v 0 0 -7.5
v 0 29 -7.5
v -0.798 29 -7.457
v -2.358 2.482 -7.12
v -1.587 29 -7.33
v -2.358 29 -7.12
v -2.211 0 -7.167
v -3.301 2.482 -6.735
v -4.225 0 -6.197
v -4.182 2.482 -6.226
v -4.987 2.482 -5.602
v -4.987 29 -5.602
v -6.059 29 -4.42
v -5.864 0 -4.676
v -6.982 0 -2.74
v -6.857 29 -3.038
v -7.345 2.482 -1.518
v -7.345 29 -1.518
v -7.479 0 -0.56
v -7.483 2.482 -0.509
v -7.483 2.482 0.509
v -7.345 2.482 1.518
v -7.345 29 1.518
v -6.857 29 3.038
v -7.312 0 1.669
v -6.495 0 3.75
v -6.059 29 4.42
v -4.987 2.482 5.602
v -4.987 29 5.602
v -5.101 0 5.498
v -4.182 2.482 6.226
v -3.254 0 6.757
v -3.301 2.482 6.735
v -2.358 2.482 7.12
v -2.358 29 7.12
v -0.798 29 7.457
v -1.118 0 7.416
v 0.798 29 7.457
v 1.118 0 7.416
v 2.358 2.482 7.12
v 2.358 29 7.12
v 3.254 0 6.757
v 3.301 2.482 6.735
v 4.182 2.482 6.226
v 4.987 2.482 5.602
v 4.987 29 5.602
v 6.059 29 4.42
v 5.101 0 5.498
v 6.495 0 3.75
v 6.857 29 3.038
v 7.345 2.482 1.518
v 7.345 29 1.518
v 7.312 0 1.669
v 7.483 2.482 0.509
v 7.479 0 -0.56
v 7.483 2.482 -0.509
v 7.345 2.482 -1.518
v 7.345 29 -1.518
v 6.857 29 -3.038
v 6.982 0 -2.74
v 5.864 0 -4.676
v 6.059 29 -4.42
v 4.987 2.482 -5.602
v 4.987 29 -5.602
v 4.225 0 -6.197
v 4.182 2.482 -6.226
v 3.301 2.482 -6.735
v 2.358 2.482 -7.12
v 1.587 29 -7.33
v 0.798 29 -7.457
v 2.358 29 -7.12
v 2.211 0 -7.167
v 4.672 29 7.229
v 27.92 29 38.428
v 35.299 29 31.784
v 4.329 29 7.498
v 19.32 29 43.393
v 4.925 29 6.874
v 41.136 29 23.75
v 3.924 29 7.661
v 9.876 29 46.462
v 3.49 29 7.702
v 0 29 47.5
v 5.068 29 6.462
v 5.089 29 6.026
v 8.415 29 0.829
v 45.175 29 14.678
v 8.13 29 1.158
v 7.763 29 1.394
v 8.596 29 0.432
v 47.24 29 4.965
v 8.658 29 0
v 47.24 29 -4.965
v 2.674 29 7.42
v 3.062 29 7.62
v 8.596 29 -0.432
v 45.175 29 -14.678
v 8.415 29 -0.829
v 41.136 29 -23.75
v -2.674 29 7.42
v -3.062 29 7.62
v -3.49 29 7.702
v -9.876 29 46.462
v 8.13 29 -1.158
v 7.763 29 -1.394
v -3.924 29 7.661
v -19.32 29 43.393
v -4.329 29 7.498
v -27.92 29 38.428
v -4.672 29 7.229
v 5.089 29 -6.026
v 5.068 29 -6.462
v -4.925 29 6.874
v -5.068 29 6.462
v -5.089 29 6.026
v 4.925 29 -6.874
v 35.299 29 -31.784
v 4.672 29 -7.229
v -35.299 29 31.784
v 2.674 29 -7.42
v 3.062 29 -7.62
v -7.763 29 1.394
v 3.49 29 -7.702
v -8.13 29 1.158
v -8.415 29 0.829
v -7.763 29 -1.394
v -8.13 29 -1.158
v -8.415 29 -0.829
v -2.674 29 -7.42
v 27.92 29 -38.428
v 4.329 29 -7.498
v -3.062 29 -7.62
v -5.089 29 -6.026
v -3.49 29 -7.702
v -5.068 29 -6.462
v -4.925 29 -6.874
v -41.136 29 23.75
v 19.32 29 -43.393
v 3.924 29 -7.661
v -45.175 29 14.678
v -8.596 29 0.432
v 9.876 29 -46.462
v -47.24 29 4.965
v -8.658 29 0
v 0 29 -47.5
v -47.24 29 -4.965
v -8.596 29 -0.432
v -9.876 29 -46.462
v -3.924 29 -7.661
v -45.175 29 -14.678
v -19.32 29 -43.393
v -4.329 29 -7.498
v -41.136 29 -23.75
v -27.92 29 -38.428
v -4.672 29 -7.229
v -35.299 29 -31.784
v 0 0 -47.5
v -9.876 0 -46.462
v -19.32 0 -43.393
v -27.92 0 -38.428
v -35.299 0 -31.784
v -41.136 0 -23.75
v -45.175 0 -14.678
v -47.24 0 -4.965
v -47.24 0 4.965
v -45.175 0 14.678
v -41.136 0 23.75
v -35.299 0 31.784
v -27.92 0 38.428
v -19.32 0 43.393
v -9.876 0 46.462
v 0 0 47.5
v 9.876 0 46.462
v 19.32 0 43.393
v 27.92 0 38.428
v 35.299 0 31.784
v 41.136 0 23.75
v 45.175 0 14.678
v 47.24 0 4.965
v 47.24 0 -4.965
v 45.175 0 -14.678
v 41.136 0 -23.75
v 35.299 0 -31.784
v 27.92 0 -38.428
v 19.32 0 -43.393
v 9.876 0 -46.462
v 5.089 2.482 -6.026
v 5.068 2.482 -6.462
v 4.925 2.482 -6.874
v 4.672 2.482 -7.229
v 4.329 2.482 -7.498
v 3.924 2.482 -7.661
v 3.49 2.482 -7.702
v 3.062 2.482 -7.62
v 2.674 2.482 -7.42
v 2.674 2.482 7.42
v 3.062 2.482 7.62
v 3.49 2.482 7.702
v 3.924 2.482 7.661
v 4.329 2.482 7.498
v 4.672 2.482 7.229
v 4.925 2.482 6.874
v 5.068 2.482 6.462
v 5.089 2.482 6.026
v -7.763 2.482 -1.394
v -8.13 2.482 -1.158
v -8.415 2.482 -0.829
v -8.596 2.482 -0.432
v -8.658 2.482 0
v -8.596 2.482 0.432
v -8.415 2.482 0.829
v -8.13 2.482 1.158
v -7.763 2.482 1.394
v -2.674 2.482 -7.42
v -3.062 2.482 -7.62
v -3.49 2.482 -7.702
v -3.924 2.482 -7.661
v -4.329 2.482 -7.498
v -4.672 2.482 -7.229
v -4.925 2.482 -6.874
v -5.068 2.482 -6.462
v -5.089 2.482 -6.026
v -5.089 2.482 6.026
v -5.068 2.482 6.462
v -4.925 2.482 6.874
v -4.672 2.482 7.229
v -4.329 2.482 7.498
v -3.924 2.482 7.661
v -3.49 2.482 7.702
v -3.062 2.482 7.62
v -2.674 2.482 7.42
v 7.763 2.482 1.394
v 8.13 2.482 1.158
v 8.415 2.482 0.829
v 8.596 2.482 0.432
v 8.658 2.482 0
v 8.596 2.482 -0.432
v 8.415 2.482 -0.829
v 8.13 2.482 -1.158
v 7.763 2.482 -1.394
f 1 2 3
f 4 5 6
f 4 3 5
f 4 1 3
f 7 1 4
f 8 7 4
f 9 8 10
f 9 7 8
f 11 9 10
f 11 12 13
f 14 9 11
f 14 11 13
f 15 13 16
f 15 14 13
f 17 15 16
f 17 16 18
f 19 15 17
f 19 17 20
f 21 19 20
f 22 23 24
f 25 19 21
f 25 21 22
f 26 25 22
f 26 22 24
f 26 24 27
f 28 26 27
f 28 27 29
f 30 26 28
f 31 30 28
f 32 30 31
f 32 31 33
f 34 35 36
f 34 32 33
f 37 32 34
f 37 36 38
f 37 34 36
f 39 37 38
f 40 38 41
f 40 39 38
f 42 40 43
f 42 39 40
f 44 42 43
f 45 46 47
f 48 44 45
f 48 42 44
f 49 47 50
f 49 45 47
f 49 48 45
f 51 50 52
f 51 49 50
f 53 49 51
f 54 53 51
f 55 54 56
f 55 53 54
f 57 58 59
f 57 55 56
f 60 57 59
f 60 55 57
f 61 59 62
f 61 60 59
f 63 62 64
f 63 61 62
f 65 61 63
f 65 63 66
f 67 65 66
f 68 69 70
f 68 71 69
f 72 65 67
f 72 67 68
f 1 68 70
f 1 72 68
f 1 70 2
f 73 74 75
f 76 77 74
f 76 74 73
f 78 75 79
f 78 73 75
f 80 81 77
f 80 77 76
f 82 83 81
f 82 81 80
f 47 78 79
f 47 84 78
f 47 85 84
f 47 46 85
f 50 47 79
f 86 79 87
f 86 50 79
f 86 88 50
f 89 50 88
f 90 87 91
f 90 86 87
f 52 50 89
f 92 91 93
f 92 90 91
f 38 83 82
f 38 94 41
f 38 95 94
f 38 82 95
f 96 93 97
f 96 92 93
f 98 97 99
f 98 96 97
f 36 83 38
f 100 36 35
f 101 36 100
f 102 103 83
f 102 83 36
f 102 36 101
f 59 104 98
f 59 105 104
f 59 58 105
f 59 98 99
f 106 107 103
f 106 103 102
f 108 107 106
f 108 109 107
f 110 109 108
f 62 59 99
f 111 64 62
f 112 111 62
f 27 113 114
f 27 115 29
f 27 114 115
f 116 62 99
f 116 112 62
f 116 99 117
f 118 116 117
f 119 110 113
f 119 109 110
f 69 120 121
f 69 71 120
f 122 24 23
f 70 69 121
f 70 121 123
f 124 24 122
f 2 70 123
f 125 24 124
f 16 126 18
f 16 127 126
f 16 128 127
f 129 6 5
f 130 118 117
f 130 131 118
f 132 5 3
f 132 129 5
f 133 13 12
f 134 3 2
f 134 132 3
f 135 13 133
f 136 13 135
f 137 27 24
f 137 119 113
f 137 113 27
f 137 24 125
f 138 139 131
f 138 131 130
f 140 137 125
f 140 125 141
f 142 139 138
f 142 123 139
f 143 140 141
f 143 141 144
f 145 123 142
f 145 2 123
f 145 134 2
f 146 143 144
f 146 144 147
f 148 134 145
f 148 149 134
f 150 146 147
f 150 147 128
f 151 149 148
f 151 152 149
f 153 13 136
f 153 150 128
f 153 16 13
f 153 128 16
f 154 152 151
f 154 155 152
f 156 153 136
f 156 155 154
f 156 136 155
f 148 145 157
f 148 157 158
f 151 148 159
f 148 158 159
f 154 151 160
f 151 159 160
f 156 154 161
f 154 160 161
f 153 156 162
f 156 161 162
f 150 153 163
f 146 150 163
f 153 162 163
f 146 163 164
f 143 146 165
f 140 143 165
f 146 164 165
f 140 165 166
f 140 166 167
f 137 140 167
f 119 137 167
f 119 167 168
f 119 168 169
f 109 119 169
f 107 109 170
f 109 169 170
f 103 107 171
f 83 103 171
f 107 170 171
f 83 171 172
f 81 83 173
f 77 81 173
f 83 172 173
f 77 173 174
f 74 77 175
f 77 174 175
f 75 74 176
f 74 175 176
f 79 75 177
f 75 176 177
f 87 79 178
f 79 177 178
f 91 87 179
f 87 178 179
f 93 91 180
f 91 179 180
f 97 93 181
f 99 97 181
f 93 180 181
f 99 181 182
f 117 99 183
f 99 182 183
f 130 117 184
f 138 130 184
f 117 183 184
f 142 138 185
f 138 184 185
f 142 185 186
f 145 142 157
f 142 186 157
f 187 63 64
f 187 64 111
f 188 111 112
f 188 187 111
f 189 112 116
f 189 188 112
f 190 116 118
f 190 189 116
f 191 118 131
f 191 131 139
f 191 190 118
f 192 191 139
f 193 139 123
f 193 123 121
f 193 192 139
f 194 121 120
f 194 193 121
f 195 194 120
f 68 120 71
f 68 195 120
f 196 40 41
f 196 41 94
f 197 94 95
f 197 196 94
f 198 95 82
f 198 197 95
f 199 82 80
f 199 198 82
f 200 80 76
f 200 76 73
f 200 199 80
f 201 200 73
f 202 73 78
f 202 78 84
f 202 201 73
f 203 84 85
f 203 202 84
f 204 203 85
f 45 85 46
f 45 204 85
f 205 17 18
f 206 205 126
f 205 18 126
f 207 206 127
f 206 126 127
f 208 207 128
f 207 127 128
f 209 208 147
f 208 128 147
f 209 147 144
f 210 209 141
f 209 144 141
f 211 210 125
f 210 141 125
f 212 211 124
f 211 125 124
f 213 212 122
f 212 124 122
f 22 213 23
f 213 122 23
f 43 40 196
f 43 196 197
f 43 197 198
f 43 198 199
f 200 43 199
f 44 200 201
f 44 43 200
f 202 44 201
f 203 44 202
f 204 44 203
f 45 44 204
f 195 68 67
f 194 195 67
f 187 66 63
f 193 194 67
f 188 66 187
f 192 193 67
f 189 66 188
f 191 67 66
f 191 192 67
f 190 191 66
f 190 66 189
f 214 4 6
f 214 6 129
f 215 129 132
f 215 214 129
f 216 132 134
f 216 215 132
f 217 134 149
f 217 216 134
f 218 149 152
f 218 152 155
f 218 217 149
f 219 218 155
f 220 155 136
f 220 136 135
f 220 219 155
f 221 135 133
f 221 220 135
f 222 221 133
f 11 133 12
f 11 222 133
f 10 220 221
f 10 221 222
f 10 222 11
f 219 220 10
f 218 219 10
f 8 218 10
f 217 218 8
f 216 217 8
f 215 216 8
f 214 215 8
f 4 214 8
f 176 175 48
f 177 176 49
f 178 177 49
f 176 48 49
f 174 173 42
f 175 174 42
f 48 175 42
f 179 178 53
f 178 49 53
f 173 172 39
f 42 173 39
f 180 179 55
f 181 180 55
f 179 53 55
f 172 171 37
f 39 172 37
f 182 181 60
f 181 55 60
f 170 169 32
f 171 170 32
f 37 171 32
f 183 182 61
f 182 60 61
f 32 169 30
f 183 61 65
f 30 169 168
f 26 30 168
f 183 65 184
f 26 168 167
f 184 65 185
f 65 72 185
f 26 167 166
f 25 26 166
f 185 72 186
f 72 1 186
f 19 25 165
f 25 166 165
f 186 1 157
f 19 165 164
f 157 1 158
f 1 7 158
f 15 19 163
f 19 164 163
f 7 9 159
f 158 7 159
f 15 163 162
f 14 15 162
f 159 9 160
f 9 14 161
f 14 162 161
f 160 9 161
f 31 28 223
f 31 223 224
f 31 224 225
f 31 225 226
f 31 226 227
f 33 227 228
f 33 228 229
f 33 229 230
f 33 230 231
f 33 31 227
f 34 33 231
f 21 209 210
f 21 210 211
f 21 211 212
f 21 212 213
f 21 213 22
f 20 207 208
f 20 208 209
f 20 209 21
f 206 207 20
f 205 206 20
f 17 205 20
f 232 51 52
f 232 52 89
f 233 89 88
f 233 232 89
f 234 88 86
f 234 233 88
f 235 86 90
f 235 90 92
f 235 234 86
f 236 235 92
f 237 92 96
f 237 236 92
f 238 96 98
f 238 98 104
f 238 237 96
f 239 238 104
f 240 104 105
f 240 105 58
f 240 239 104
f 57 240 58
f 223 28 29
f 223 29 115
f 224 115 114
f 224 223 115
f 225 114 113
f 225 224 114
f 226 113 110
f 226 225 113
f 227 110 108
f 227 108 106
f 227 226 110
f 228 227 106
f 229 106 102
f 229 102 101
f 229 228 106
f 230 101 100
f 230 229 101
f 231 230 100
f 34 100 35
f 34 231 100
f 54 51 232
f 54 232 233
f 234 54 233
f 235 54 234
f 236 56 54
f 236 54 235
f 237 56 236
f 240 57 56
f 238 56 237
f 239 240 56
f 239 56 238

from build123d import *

# Parameters (mm, degrees)
SKETCH1_R           = 47.5
BOSS_EXTRUDE1_DEPTH = 29
SKETCH2_R           = 7.5
CUT_EXTRUDE1_DEPTH  = 74.167615787
SKETCH3_R           = 1.533548882
CUT_EXTRUDE2_DEPTH  = 26.517871126
CIRPATTERN1_COUNT   = 6


with BuildPart() as part:
    # Sketch1 → Boss-Extrude1 (new body)
    with BuildSketch(Plane(origin=(0, 0, 0), x_dir=(1, 0, 0), z_dir=(0, 1, 0))):
        Circle(SKETCH1_R)
    extrude(amount=BOSS_EXTRUDE1_DEPTH)

    # Sketch2 → Cut-Extrude1 (cut, through all)
    with BuildSketch(Plane(origin=(0, 0, 0), x_dir=(1, 0, 0), z_dir=(0, 1, 0))):
        Circle(SKETCH2_R)
    extrude(amount=CUT_EXTRUDE1_DEPTH, mode=Mode.SUBTRACT)

    # Sketch3 → Cut-Extrude2 (cut)
    with BuildSketch(Plane(origin=(0, 29, 0), x_dir=(1, 0, 0), z_dir=(0, 1, 0))):
        with Locations((-7.124914208, 0)):
            Circle(SKETCH3_R)
    cut_extrude2 = extrude(amount=-CUT_EXTRUDE2_DEPTH, mode=Mode.SUBTRACT)

    # CirPattern1: Cut-Extrude2 ×6 about axis
    cirpattern1_axis = Axis((0, 0, 0), (0, 1, 0))
    for i in range(1, CIRPATTERN1_COUNT):
        add(cut_extrude2.rotate(cirpattern1_axis, i * 360 / CIRPATTERN1_COUNT), mode=Mode.SUBTRACT)


solid = part.part
